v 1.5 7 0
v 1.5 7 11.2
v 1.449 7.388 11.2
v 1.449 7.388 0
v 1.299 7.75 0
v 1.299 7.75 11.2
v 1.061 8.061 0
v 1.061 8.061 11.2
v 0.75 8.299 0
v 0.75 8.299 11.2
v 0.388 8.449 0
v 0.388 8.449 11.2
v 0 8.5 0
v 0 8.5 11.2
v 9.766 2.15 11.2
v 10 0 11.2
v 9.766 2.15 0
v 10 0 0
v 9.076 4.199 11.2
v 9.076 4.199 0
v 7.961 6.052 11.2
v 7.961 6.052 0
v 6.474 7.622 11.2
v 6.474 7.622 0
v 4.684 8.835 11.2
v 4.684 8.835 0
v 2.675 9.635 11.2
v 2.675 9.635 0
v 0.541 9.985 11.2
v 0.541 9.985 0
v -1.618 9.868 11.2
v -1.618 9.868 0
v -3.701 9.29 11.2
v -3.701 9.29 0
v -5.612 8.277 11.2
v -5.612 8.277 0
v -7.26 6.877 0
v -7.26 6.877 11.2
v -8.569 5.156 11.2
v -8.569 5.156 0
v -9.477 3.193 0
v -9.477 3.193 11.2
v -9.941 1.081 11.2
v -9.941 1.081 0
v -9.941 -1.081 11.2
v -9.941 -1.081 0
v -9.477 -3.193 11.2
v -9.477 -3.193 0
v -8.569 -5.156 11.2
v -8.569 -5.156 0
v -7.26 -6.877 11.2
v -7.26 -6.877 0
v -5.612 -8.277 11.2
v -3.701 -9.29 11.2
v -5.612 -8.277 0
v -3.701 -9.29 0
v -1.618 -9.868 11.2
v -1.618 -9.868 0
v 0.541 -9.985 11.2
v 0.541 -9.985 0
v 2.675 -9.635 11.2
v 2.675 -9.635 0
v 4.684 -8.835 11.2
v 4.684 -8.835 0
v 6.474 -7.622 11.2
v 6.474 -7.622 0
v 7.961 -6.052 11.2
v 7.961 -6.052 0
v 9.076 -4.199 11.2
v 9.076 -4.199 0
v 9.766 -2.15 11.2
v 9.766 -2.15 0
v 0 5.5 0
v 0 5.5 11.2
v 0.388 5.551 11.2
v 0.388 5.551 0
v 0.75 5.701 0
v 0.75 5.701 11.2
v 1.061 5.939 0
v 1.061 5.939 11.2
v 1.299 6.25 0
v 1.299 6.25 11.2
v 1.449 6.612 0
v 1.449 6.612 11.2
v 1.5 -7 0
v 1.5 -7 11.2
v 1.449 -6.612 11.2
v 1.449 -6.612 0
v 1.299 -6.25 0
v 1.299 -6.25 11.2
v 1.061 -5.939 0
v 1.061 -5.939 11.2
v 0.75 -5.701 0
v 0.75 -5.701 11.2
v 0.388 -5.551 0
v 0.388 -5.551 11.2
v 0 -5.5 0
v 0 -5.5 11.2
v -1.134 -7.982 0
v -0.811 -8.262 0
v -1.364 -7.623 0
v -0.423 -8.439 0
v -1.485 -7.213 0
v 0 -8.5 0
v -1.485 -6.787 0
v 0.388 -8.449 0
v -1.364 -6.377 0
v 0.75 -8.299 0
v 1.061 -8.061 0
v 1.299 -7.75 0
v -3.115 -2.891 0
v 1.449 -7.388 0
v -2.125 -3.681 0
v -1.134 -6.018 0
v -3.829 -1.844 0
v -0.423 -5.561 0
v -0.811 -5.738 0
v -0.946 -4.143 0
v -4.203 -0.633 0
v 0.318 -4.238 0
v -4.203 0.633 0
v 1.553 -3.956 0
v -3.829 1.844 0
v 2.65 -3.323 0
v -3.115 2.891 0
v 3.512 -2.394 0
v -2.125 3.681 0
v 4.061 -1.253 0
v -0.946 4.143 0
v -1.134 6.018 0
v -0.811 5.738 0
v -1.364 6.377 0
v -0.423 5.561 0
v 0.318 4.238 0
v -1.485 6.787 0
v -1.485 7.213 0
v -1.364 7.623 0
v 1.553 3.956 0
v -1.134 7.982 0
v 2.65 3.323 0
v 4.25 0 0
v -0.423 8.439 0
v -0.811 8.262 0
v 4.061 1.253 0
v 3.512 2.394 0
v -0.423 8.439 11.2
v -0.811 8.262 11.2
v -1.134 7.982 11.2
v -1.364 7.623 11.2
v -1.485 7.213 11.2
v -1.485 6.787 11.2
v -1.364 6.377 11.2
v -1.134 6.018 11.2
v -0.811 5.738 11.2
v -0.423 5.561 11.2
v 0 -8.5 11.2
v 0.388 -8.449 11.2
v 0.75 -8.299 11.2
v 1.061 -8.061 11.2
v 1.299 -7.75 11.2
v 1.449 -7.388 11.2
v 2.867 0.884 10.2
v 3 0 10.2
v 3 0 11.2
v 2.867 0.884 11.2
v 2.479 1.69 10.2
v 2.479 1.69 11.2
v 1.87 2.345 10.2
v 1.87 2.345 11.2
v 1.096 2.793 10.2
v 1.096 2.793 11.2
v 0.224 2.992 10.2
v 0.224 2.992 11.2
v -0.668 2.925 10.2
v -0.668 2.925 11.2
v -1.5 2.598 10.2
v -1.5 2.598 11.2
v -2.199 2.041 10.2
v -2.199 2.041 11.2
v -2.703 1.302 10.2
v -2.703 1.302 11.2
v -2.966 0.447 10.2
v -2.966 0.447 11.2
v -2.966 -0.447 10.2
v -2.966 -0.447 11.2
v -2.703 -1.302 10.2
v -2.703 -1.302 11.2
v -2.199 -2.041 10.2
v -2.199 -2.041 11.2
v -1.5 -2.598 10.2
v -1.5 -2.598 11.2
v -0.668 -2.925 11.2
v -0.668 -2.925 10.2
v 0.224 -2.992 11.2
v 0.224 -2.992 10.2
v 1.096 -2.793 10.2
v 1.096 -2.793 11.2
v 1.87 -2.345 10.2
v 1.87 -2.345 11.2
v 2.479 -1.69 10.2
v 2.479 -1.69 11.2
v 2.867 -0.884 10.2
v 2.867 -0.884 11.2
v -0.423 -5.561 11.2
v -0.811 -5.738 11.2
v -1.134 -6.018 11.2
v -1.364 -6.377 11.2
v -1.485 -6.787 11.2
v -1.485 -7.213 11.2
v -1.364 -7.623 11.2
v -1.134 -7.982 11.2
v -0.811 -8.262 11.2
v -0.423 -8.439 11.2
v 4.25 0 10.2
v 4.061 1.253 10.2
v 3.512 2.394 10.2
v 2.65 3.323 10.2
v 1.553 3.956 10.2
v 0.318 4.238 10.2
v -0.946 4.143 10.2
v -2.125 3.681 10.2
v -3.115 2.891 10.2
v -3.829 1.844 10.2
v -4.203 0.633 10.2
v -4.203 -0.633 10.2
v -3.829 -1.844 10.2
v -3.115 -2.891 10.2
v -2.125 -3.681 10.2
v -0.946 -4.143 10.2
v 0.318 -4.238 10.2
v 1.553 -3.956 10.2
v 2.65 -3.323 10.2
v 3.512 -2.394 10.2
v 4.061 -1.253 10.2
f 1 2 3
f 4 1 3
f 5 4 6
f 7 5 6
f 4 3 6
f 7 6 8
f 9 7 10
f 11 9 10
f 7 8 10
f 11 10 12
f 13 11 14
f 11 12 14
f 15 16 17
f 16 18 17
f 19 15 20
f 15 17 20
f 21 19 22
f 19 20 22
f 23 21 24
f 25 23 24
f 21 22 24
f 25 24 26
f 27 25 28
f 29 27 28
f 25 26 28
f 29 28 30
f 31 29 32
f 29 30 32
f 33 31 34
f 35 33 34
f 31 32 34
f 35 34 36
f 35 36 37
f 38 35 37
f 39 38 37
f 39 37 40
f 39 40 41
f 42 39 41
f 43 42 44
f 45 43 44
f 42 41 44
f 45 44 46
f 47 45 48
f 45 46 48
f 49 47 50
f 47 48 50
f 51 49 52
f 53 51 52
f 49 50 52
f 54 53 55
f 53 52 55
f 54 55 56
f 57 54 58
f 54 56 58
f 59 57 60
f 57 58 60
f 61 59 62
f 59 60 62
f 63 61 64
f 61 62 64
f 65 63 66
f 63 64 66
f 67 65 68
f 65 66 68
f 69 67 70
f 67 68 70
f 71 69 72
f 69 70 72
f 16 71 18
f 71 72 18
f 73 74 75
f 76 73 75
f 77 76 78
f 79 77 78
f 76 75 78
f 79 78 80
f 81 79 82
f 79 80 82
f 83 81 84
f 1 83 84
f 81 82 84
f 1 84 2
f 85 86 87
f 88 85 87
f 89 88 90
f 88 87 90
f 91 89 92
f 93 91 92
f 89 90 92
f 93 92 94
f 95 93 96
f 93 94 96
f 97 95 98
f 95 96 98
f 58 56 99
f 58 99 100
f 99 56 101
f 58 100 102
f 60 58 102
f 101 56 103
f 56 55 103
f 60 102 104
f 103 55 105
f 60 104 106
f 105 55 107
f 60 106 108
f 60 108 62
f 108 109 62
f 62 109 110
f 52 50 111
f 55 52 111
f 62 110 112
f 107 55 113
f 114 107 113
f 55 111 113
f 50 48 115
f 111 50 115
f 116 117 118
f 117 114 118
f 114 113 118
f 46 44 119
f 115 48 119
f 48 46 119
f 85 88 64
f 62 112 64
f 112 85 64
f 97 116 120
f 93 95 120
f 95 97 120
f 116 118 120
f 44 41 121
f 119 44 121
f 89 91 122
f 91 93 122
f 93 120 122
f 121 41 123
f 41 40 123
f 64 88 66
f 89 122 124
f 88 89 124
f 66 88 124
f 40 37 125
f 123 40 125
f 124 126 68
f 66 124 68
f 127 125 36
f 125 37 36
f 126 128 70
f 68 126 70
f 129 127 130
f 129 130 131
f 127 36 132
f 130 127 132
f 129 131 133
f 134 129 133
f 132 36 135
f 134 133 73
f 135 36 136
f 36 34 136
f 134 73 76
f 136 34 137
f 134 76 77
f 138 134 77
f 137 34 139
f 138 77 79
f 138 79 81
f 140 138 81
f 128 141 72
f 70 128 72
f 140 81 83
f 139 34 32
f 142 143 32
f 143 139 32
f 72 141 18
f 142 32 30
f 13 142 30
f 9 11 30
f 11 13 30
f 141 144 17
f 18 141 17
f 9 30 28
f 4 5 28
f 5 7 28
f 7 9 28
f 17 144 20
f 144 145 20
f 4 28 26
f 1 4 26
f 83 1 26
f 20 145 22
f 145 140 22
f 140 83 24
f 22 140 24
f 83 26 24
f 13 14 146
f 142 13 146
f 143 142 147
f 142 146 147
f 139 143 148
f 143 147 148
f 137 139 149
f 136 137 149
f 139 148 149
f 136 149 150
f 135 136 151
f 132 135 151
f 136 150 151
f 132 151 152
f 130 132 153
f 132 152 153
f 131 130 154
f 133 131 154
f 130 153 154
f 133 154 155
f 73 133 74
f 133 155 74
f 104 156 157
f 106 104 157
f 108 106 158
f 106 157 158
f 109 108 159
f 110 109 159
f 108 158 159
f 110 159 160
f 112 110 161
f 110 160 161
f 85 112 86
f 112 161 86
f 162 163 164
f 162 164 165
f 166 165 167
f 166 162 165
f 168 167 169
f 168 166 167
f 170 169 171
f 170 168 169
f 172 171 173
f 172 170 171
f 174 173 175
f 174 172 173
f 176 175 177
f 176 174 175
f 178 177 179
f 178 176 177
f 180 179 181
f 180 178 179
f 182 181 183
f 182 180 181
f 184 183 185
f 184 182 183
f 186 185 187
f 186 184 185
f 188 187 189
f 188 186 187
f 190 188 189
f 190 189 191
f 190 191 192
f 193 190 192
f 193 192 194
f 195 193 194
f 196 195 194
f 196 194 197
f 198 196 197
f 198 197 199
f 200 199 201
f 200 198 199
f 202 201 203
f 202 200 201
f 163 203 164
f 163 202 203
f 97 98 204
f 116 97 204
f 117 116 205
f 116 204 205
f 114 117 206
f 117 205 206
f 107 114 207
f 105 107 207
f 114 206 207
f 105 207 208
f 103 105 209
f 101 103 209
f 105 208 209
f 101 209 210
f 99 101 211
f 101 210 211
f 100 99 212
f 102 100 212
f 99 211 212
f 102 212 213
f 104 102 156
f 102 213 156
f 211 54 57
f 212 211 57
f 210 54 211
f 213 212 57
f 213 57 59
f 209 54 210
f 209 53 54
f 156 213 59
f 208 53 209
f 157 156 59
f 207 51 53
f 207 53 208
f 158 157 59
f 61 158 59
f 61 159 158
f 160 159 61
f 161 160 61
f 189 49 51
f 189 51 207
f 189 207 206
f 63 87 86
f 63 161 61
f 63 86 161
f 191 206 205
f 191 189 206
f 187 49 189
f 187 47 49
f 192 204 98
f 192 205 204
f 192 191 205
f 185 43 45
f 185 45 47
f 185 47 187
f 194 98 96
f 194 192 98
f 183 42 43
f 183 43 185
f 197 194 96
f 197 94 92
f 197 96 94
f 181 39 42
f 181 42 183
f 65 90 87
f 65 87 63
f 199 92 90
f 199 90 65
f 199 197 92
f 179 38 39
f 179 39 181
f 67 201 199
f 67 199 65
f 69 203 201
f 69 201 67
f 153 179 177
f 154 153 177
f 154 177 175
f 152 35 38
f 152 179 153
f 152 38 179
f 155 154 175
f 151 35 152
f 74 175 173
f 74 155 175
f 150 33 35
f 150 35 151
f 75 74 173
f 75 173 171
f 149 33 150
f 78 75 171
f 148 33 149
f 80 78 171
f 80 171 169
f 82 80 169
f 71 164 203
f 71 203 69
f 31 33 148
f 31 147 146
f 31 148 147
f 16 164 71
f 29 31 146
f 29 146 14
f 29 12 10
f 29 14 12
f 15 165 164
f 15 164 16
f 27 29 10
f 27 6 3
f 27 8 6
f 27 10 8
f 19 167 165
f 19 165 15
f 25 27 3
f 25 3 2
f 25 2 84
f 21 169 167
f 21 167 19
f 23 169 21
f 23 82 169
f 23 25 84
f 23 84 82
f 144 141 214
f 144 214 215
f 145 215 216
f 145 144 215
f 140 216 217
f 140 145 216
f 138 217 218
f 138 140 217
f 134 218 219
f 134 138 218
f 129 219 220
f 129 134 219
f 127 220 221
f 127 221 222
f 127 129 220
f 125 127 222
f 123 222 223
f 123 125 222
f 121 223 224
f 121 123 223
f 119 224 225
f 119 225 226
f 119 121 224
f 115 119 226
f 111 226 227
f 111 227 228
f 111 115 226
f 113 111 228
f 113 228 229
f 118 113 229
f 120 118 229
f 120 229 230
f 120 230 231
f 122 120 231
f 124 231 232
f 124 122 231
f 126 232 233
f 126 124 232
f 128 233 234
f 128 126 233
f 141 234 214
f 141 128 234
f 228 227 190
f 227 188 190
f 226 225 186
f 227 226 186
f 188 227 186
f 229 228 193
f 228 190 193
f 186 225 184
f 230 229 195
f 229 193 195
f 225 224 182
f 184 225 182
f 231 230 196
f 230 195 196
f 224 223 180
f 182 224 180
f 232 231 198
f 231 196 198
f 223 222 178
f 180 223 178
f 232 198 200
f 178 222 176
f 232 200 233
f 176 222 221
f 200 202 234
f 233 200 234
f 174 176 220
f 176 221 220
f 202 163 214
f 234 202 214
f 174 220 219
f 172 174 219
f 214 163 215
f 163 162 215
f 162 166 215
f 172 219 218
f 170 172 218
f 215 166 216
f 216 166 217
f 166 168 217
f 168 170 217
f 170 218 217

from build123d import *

# Parameters (mm, degrees)
F0_R     = 10
F0_R_2   = 4.25
F1_DEPTH = 10.2
F3_R     = 10
F3_R_2   = 3
F4_DEPTH = 1
F7_DEPTH = 15


with BuildPart() as f1:
    # F0 (on Top) → F1 (new body)
    with BuildSketch(Plane.XY):
        Circle(F0_R)
        Circle(F0_R_2, mode=Mode.SUBTRACT)
    extrude(amount=F1_DEPTH)

    # F3 (on offset) → F4 (join)
    with BuildSketch(Plane.XY.offset(10.2)):
        Circle(F3_R)
        Circle(F3_R_2, mode=Mode.SUBTRACT)
    extrude(amount=F4_DEPTH)

    # F6 (on offset) → F7 (cut)
    with BuildSketch(Plane.XY.offset(11.2)):
        with BuildLine():
            ThreePointArc((0, -5.5), (-1.5, -7), (0, -8.5))
            Line((0, -8.5), (0, -5.5))
        make_face()
        with BuildLine():
            ThreePointArc((0, 8.5), (-1.5, 7), (0, 5.5))
            Line((0, 5.5), (0, 8.5))
        make_face()
        with BuildLine():
            Line((0, 8.5), (0, 5.5))
            ThreePointArc((0, 5.5), (1.06066, 5.93934), (1.5, 7))
            ThreePointArc((1.5, 7), (1.06066, 8.06066), (0, 8.5))
        make_face()
        with BuildLine():
            Line((0, -5.5), (0, -8.5))
            ThreePointArc((0, -8.5), (1.06066, -8.06066), (1.5, -7))
            ThreePointArc((1.5, -7), (1.06066, -5.93934), (0, -5.5))
        make_face()
    extrude(amount=-F7_DEPTH, mode=Mode.SUBTRACT)


solid = f1.part
